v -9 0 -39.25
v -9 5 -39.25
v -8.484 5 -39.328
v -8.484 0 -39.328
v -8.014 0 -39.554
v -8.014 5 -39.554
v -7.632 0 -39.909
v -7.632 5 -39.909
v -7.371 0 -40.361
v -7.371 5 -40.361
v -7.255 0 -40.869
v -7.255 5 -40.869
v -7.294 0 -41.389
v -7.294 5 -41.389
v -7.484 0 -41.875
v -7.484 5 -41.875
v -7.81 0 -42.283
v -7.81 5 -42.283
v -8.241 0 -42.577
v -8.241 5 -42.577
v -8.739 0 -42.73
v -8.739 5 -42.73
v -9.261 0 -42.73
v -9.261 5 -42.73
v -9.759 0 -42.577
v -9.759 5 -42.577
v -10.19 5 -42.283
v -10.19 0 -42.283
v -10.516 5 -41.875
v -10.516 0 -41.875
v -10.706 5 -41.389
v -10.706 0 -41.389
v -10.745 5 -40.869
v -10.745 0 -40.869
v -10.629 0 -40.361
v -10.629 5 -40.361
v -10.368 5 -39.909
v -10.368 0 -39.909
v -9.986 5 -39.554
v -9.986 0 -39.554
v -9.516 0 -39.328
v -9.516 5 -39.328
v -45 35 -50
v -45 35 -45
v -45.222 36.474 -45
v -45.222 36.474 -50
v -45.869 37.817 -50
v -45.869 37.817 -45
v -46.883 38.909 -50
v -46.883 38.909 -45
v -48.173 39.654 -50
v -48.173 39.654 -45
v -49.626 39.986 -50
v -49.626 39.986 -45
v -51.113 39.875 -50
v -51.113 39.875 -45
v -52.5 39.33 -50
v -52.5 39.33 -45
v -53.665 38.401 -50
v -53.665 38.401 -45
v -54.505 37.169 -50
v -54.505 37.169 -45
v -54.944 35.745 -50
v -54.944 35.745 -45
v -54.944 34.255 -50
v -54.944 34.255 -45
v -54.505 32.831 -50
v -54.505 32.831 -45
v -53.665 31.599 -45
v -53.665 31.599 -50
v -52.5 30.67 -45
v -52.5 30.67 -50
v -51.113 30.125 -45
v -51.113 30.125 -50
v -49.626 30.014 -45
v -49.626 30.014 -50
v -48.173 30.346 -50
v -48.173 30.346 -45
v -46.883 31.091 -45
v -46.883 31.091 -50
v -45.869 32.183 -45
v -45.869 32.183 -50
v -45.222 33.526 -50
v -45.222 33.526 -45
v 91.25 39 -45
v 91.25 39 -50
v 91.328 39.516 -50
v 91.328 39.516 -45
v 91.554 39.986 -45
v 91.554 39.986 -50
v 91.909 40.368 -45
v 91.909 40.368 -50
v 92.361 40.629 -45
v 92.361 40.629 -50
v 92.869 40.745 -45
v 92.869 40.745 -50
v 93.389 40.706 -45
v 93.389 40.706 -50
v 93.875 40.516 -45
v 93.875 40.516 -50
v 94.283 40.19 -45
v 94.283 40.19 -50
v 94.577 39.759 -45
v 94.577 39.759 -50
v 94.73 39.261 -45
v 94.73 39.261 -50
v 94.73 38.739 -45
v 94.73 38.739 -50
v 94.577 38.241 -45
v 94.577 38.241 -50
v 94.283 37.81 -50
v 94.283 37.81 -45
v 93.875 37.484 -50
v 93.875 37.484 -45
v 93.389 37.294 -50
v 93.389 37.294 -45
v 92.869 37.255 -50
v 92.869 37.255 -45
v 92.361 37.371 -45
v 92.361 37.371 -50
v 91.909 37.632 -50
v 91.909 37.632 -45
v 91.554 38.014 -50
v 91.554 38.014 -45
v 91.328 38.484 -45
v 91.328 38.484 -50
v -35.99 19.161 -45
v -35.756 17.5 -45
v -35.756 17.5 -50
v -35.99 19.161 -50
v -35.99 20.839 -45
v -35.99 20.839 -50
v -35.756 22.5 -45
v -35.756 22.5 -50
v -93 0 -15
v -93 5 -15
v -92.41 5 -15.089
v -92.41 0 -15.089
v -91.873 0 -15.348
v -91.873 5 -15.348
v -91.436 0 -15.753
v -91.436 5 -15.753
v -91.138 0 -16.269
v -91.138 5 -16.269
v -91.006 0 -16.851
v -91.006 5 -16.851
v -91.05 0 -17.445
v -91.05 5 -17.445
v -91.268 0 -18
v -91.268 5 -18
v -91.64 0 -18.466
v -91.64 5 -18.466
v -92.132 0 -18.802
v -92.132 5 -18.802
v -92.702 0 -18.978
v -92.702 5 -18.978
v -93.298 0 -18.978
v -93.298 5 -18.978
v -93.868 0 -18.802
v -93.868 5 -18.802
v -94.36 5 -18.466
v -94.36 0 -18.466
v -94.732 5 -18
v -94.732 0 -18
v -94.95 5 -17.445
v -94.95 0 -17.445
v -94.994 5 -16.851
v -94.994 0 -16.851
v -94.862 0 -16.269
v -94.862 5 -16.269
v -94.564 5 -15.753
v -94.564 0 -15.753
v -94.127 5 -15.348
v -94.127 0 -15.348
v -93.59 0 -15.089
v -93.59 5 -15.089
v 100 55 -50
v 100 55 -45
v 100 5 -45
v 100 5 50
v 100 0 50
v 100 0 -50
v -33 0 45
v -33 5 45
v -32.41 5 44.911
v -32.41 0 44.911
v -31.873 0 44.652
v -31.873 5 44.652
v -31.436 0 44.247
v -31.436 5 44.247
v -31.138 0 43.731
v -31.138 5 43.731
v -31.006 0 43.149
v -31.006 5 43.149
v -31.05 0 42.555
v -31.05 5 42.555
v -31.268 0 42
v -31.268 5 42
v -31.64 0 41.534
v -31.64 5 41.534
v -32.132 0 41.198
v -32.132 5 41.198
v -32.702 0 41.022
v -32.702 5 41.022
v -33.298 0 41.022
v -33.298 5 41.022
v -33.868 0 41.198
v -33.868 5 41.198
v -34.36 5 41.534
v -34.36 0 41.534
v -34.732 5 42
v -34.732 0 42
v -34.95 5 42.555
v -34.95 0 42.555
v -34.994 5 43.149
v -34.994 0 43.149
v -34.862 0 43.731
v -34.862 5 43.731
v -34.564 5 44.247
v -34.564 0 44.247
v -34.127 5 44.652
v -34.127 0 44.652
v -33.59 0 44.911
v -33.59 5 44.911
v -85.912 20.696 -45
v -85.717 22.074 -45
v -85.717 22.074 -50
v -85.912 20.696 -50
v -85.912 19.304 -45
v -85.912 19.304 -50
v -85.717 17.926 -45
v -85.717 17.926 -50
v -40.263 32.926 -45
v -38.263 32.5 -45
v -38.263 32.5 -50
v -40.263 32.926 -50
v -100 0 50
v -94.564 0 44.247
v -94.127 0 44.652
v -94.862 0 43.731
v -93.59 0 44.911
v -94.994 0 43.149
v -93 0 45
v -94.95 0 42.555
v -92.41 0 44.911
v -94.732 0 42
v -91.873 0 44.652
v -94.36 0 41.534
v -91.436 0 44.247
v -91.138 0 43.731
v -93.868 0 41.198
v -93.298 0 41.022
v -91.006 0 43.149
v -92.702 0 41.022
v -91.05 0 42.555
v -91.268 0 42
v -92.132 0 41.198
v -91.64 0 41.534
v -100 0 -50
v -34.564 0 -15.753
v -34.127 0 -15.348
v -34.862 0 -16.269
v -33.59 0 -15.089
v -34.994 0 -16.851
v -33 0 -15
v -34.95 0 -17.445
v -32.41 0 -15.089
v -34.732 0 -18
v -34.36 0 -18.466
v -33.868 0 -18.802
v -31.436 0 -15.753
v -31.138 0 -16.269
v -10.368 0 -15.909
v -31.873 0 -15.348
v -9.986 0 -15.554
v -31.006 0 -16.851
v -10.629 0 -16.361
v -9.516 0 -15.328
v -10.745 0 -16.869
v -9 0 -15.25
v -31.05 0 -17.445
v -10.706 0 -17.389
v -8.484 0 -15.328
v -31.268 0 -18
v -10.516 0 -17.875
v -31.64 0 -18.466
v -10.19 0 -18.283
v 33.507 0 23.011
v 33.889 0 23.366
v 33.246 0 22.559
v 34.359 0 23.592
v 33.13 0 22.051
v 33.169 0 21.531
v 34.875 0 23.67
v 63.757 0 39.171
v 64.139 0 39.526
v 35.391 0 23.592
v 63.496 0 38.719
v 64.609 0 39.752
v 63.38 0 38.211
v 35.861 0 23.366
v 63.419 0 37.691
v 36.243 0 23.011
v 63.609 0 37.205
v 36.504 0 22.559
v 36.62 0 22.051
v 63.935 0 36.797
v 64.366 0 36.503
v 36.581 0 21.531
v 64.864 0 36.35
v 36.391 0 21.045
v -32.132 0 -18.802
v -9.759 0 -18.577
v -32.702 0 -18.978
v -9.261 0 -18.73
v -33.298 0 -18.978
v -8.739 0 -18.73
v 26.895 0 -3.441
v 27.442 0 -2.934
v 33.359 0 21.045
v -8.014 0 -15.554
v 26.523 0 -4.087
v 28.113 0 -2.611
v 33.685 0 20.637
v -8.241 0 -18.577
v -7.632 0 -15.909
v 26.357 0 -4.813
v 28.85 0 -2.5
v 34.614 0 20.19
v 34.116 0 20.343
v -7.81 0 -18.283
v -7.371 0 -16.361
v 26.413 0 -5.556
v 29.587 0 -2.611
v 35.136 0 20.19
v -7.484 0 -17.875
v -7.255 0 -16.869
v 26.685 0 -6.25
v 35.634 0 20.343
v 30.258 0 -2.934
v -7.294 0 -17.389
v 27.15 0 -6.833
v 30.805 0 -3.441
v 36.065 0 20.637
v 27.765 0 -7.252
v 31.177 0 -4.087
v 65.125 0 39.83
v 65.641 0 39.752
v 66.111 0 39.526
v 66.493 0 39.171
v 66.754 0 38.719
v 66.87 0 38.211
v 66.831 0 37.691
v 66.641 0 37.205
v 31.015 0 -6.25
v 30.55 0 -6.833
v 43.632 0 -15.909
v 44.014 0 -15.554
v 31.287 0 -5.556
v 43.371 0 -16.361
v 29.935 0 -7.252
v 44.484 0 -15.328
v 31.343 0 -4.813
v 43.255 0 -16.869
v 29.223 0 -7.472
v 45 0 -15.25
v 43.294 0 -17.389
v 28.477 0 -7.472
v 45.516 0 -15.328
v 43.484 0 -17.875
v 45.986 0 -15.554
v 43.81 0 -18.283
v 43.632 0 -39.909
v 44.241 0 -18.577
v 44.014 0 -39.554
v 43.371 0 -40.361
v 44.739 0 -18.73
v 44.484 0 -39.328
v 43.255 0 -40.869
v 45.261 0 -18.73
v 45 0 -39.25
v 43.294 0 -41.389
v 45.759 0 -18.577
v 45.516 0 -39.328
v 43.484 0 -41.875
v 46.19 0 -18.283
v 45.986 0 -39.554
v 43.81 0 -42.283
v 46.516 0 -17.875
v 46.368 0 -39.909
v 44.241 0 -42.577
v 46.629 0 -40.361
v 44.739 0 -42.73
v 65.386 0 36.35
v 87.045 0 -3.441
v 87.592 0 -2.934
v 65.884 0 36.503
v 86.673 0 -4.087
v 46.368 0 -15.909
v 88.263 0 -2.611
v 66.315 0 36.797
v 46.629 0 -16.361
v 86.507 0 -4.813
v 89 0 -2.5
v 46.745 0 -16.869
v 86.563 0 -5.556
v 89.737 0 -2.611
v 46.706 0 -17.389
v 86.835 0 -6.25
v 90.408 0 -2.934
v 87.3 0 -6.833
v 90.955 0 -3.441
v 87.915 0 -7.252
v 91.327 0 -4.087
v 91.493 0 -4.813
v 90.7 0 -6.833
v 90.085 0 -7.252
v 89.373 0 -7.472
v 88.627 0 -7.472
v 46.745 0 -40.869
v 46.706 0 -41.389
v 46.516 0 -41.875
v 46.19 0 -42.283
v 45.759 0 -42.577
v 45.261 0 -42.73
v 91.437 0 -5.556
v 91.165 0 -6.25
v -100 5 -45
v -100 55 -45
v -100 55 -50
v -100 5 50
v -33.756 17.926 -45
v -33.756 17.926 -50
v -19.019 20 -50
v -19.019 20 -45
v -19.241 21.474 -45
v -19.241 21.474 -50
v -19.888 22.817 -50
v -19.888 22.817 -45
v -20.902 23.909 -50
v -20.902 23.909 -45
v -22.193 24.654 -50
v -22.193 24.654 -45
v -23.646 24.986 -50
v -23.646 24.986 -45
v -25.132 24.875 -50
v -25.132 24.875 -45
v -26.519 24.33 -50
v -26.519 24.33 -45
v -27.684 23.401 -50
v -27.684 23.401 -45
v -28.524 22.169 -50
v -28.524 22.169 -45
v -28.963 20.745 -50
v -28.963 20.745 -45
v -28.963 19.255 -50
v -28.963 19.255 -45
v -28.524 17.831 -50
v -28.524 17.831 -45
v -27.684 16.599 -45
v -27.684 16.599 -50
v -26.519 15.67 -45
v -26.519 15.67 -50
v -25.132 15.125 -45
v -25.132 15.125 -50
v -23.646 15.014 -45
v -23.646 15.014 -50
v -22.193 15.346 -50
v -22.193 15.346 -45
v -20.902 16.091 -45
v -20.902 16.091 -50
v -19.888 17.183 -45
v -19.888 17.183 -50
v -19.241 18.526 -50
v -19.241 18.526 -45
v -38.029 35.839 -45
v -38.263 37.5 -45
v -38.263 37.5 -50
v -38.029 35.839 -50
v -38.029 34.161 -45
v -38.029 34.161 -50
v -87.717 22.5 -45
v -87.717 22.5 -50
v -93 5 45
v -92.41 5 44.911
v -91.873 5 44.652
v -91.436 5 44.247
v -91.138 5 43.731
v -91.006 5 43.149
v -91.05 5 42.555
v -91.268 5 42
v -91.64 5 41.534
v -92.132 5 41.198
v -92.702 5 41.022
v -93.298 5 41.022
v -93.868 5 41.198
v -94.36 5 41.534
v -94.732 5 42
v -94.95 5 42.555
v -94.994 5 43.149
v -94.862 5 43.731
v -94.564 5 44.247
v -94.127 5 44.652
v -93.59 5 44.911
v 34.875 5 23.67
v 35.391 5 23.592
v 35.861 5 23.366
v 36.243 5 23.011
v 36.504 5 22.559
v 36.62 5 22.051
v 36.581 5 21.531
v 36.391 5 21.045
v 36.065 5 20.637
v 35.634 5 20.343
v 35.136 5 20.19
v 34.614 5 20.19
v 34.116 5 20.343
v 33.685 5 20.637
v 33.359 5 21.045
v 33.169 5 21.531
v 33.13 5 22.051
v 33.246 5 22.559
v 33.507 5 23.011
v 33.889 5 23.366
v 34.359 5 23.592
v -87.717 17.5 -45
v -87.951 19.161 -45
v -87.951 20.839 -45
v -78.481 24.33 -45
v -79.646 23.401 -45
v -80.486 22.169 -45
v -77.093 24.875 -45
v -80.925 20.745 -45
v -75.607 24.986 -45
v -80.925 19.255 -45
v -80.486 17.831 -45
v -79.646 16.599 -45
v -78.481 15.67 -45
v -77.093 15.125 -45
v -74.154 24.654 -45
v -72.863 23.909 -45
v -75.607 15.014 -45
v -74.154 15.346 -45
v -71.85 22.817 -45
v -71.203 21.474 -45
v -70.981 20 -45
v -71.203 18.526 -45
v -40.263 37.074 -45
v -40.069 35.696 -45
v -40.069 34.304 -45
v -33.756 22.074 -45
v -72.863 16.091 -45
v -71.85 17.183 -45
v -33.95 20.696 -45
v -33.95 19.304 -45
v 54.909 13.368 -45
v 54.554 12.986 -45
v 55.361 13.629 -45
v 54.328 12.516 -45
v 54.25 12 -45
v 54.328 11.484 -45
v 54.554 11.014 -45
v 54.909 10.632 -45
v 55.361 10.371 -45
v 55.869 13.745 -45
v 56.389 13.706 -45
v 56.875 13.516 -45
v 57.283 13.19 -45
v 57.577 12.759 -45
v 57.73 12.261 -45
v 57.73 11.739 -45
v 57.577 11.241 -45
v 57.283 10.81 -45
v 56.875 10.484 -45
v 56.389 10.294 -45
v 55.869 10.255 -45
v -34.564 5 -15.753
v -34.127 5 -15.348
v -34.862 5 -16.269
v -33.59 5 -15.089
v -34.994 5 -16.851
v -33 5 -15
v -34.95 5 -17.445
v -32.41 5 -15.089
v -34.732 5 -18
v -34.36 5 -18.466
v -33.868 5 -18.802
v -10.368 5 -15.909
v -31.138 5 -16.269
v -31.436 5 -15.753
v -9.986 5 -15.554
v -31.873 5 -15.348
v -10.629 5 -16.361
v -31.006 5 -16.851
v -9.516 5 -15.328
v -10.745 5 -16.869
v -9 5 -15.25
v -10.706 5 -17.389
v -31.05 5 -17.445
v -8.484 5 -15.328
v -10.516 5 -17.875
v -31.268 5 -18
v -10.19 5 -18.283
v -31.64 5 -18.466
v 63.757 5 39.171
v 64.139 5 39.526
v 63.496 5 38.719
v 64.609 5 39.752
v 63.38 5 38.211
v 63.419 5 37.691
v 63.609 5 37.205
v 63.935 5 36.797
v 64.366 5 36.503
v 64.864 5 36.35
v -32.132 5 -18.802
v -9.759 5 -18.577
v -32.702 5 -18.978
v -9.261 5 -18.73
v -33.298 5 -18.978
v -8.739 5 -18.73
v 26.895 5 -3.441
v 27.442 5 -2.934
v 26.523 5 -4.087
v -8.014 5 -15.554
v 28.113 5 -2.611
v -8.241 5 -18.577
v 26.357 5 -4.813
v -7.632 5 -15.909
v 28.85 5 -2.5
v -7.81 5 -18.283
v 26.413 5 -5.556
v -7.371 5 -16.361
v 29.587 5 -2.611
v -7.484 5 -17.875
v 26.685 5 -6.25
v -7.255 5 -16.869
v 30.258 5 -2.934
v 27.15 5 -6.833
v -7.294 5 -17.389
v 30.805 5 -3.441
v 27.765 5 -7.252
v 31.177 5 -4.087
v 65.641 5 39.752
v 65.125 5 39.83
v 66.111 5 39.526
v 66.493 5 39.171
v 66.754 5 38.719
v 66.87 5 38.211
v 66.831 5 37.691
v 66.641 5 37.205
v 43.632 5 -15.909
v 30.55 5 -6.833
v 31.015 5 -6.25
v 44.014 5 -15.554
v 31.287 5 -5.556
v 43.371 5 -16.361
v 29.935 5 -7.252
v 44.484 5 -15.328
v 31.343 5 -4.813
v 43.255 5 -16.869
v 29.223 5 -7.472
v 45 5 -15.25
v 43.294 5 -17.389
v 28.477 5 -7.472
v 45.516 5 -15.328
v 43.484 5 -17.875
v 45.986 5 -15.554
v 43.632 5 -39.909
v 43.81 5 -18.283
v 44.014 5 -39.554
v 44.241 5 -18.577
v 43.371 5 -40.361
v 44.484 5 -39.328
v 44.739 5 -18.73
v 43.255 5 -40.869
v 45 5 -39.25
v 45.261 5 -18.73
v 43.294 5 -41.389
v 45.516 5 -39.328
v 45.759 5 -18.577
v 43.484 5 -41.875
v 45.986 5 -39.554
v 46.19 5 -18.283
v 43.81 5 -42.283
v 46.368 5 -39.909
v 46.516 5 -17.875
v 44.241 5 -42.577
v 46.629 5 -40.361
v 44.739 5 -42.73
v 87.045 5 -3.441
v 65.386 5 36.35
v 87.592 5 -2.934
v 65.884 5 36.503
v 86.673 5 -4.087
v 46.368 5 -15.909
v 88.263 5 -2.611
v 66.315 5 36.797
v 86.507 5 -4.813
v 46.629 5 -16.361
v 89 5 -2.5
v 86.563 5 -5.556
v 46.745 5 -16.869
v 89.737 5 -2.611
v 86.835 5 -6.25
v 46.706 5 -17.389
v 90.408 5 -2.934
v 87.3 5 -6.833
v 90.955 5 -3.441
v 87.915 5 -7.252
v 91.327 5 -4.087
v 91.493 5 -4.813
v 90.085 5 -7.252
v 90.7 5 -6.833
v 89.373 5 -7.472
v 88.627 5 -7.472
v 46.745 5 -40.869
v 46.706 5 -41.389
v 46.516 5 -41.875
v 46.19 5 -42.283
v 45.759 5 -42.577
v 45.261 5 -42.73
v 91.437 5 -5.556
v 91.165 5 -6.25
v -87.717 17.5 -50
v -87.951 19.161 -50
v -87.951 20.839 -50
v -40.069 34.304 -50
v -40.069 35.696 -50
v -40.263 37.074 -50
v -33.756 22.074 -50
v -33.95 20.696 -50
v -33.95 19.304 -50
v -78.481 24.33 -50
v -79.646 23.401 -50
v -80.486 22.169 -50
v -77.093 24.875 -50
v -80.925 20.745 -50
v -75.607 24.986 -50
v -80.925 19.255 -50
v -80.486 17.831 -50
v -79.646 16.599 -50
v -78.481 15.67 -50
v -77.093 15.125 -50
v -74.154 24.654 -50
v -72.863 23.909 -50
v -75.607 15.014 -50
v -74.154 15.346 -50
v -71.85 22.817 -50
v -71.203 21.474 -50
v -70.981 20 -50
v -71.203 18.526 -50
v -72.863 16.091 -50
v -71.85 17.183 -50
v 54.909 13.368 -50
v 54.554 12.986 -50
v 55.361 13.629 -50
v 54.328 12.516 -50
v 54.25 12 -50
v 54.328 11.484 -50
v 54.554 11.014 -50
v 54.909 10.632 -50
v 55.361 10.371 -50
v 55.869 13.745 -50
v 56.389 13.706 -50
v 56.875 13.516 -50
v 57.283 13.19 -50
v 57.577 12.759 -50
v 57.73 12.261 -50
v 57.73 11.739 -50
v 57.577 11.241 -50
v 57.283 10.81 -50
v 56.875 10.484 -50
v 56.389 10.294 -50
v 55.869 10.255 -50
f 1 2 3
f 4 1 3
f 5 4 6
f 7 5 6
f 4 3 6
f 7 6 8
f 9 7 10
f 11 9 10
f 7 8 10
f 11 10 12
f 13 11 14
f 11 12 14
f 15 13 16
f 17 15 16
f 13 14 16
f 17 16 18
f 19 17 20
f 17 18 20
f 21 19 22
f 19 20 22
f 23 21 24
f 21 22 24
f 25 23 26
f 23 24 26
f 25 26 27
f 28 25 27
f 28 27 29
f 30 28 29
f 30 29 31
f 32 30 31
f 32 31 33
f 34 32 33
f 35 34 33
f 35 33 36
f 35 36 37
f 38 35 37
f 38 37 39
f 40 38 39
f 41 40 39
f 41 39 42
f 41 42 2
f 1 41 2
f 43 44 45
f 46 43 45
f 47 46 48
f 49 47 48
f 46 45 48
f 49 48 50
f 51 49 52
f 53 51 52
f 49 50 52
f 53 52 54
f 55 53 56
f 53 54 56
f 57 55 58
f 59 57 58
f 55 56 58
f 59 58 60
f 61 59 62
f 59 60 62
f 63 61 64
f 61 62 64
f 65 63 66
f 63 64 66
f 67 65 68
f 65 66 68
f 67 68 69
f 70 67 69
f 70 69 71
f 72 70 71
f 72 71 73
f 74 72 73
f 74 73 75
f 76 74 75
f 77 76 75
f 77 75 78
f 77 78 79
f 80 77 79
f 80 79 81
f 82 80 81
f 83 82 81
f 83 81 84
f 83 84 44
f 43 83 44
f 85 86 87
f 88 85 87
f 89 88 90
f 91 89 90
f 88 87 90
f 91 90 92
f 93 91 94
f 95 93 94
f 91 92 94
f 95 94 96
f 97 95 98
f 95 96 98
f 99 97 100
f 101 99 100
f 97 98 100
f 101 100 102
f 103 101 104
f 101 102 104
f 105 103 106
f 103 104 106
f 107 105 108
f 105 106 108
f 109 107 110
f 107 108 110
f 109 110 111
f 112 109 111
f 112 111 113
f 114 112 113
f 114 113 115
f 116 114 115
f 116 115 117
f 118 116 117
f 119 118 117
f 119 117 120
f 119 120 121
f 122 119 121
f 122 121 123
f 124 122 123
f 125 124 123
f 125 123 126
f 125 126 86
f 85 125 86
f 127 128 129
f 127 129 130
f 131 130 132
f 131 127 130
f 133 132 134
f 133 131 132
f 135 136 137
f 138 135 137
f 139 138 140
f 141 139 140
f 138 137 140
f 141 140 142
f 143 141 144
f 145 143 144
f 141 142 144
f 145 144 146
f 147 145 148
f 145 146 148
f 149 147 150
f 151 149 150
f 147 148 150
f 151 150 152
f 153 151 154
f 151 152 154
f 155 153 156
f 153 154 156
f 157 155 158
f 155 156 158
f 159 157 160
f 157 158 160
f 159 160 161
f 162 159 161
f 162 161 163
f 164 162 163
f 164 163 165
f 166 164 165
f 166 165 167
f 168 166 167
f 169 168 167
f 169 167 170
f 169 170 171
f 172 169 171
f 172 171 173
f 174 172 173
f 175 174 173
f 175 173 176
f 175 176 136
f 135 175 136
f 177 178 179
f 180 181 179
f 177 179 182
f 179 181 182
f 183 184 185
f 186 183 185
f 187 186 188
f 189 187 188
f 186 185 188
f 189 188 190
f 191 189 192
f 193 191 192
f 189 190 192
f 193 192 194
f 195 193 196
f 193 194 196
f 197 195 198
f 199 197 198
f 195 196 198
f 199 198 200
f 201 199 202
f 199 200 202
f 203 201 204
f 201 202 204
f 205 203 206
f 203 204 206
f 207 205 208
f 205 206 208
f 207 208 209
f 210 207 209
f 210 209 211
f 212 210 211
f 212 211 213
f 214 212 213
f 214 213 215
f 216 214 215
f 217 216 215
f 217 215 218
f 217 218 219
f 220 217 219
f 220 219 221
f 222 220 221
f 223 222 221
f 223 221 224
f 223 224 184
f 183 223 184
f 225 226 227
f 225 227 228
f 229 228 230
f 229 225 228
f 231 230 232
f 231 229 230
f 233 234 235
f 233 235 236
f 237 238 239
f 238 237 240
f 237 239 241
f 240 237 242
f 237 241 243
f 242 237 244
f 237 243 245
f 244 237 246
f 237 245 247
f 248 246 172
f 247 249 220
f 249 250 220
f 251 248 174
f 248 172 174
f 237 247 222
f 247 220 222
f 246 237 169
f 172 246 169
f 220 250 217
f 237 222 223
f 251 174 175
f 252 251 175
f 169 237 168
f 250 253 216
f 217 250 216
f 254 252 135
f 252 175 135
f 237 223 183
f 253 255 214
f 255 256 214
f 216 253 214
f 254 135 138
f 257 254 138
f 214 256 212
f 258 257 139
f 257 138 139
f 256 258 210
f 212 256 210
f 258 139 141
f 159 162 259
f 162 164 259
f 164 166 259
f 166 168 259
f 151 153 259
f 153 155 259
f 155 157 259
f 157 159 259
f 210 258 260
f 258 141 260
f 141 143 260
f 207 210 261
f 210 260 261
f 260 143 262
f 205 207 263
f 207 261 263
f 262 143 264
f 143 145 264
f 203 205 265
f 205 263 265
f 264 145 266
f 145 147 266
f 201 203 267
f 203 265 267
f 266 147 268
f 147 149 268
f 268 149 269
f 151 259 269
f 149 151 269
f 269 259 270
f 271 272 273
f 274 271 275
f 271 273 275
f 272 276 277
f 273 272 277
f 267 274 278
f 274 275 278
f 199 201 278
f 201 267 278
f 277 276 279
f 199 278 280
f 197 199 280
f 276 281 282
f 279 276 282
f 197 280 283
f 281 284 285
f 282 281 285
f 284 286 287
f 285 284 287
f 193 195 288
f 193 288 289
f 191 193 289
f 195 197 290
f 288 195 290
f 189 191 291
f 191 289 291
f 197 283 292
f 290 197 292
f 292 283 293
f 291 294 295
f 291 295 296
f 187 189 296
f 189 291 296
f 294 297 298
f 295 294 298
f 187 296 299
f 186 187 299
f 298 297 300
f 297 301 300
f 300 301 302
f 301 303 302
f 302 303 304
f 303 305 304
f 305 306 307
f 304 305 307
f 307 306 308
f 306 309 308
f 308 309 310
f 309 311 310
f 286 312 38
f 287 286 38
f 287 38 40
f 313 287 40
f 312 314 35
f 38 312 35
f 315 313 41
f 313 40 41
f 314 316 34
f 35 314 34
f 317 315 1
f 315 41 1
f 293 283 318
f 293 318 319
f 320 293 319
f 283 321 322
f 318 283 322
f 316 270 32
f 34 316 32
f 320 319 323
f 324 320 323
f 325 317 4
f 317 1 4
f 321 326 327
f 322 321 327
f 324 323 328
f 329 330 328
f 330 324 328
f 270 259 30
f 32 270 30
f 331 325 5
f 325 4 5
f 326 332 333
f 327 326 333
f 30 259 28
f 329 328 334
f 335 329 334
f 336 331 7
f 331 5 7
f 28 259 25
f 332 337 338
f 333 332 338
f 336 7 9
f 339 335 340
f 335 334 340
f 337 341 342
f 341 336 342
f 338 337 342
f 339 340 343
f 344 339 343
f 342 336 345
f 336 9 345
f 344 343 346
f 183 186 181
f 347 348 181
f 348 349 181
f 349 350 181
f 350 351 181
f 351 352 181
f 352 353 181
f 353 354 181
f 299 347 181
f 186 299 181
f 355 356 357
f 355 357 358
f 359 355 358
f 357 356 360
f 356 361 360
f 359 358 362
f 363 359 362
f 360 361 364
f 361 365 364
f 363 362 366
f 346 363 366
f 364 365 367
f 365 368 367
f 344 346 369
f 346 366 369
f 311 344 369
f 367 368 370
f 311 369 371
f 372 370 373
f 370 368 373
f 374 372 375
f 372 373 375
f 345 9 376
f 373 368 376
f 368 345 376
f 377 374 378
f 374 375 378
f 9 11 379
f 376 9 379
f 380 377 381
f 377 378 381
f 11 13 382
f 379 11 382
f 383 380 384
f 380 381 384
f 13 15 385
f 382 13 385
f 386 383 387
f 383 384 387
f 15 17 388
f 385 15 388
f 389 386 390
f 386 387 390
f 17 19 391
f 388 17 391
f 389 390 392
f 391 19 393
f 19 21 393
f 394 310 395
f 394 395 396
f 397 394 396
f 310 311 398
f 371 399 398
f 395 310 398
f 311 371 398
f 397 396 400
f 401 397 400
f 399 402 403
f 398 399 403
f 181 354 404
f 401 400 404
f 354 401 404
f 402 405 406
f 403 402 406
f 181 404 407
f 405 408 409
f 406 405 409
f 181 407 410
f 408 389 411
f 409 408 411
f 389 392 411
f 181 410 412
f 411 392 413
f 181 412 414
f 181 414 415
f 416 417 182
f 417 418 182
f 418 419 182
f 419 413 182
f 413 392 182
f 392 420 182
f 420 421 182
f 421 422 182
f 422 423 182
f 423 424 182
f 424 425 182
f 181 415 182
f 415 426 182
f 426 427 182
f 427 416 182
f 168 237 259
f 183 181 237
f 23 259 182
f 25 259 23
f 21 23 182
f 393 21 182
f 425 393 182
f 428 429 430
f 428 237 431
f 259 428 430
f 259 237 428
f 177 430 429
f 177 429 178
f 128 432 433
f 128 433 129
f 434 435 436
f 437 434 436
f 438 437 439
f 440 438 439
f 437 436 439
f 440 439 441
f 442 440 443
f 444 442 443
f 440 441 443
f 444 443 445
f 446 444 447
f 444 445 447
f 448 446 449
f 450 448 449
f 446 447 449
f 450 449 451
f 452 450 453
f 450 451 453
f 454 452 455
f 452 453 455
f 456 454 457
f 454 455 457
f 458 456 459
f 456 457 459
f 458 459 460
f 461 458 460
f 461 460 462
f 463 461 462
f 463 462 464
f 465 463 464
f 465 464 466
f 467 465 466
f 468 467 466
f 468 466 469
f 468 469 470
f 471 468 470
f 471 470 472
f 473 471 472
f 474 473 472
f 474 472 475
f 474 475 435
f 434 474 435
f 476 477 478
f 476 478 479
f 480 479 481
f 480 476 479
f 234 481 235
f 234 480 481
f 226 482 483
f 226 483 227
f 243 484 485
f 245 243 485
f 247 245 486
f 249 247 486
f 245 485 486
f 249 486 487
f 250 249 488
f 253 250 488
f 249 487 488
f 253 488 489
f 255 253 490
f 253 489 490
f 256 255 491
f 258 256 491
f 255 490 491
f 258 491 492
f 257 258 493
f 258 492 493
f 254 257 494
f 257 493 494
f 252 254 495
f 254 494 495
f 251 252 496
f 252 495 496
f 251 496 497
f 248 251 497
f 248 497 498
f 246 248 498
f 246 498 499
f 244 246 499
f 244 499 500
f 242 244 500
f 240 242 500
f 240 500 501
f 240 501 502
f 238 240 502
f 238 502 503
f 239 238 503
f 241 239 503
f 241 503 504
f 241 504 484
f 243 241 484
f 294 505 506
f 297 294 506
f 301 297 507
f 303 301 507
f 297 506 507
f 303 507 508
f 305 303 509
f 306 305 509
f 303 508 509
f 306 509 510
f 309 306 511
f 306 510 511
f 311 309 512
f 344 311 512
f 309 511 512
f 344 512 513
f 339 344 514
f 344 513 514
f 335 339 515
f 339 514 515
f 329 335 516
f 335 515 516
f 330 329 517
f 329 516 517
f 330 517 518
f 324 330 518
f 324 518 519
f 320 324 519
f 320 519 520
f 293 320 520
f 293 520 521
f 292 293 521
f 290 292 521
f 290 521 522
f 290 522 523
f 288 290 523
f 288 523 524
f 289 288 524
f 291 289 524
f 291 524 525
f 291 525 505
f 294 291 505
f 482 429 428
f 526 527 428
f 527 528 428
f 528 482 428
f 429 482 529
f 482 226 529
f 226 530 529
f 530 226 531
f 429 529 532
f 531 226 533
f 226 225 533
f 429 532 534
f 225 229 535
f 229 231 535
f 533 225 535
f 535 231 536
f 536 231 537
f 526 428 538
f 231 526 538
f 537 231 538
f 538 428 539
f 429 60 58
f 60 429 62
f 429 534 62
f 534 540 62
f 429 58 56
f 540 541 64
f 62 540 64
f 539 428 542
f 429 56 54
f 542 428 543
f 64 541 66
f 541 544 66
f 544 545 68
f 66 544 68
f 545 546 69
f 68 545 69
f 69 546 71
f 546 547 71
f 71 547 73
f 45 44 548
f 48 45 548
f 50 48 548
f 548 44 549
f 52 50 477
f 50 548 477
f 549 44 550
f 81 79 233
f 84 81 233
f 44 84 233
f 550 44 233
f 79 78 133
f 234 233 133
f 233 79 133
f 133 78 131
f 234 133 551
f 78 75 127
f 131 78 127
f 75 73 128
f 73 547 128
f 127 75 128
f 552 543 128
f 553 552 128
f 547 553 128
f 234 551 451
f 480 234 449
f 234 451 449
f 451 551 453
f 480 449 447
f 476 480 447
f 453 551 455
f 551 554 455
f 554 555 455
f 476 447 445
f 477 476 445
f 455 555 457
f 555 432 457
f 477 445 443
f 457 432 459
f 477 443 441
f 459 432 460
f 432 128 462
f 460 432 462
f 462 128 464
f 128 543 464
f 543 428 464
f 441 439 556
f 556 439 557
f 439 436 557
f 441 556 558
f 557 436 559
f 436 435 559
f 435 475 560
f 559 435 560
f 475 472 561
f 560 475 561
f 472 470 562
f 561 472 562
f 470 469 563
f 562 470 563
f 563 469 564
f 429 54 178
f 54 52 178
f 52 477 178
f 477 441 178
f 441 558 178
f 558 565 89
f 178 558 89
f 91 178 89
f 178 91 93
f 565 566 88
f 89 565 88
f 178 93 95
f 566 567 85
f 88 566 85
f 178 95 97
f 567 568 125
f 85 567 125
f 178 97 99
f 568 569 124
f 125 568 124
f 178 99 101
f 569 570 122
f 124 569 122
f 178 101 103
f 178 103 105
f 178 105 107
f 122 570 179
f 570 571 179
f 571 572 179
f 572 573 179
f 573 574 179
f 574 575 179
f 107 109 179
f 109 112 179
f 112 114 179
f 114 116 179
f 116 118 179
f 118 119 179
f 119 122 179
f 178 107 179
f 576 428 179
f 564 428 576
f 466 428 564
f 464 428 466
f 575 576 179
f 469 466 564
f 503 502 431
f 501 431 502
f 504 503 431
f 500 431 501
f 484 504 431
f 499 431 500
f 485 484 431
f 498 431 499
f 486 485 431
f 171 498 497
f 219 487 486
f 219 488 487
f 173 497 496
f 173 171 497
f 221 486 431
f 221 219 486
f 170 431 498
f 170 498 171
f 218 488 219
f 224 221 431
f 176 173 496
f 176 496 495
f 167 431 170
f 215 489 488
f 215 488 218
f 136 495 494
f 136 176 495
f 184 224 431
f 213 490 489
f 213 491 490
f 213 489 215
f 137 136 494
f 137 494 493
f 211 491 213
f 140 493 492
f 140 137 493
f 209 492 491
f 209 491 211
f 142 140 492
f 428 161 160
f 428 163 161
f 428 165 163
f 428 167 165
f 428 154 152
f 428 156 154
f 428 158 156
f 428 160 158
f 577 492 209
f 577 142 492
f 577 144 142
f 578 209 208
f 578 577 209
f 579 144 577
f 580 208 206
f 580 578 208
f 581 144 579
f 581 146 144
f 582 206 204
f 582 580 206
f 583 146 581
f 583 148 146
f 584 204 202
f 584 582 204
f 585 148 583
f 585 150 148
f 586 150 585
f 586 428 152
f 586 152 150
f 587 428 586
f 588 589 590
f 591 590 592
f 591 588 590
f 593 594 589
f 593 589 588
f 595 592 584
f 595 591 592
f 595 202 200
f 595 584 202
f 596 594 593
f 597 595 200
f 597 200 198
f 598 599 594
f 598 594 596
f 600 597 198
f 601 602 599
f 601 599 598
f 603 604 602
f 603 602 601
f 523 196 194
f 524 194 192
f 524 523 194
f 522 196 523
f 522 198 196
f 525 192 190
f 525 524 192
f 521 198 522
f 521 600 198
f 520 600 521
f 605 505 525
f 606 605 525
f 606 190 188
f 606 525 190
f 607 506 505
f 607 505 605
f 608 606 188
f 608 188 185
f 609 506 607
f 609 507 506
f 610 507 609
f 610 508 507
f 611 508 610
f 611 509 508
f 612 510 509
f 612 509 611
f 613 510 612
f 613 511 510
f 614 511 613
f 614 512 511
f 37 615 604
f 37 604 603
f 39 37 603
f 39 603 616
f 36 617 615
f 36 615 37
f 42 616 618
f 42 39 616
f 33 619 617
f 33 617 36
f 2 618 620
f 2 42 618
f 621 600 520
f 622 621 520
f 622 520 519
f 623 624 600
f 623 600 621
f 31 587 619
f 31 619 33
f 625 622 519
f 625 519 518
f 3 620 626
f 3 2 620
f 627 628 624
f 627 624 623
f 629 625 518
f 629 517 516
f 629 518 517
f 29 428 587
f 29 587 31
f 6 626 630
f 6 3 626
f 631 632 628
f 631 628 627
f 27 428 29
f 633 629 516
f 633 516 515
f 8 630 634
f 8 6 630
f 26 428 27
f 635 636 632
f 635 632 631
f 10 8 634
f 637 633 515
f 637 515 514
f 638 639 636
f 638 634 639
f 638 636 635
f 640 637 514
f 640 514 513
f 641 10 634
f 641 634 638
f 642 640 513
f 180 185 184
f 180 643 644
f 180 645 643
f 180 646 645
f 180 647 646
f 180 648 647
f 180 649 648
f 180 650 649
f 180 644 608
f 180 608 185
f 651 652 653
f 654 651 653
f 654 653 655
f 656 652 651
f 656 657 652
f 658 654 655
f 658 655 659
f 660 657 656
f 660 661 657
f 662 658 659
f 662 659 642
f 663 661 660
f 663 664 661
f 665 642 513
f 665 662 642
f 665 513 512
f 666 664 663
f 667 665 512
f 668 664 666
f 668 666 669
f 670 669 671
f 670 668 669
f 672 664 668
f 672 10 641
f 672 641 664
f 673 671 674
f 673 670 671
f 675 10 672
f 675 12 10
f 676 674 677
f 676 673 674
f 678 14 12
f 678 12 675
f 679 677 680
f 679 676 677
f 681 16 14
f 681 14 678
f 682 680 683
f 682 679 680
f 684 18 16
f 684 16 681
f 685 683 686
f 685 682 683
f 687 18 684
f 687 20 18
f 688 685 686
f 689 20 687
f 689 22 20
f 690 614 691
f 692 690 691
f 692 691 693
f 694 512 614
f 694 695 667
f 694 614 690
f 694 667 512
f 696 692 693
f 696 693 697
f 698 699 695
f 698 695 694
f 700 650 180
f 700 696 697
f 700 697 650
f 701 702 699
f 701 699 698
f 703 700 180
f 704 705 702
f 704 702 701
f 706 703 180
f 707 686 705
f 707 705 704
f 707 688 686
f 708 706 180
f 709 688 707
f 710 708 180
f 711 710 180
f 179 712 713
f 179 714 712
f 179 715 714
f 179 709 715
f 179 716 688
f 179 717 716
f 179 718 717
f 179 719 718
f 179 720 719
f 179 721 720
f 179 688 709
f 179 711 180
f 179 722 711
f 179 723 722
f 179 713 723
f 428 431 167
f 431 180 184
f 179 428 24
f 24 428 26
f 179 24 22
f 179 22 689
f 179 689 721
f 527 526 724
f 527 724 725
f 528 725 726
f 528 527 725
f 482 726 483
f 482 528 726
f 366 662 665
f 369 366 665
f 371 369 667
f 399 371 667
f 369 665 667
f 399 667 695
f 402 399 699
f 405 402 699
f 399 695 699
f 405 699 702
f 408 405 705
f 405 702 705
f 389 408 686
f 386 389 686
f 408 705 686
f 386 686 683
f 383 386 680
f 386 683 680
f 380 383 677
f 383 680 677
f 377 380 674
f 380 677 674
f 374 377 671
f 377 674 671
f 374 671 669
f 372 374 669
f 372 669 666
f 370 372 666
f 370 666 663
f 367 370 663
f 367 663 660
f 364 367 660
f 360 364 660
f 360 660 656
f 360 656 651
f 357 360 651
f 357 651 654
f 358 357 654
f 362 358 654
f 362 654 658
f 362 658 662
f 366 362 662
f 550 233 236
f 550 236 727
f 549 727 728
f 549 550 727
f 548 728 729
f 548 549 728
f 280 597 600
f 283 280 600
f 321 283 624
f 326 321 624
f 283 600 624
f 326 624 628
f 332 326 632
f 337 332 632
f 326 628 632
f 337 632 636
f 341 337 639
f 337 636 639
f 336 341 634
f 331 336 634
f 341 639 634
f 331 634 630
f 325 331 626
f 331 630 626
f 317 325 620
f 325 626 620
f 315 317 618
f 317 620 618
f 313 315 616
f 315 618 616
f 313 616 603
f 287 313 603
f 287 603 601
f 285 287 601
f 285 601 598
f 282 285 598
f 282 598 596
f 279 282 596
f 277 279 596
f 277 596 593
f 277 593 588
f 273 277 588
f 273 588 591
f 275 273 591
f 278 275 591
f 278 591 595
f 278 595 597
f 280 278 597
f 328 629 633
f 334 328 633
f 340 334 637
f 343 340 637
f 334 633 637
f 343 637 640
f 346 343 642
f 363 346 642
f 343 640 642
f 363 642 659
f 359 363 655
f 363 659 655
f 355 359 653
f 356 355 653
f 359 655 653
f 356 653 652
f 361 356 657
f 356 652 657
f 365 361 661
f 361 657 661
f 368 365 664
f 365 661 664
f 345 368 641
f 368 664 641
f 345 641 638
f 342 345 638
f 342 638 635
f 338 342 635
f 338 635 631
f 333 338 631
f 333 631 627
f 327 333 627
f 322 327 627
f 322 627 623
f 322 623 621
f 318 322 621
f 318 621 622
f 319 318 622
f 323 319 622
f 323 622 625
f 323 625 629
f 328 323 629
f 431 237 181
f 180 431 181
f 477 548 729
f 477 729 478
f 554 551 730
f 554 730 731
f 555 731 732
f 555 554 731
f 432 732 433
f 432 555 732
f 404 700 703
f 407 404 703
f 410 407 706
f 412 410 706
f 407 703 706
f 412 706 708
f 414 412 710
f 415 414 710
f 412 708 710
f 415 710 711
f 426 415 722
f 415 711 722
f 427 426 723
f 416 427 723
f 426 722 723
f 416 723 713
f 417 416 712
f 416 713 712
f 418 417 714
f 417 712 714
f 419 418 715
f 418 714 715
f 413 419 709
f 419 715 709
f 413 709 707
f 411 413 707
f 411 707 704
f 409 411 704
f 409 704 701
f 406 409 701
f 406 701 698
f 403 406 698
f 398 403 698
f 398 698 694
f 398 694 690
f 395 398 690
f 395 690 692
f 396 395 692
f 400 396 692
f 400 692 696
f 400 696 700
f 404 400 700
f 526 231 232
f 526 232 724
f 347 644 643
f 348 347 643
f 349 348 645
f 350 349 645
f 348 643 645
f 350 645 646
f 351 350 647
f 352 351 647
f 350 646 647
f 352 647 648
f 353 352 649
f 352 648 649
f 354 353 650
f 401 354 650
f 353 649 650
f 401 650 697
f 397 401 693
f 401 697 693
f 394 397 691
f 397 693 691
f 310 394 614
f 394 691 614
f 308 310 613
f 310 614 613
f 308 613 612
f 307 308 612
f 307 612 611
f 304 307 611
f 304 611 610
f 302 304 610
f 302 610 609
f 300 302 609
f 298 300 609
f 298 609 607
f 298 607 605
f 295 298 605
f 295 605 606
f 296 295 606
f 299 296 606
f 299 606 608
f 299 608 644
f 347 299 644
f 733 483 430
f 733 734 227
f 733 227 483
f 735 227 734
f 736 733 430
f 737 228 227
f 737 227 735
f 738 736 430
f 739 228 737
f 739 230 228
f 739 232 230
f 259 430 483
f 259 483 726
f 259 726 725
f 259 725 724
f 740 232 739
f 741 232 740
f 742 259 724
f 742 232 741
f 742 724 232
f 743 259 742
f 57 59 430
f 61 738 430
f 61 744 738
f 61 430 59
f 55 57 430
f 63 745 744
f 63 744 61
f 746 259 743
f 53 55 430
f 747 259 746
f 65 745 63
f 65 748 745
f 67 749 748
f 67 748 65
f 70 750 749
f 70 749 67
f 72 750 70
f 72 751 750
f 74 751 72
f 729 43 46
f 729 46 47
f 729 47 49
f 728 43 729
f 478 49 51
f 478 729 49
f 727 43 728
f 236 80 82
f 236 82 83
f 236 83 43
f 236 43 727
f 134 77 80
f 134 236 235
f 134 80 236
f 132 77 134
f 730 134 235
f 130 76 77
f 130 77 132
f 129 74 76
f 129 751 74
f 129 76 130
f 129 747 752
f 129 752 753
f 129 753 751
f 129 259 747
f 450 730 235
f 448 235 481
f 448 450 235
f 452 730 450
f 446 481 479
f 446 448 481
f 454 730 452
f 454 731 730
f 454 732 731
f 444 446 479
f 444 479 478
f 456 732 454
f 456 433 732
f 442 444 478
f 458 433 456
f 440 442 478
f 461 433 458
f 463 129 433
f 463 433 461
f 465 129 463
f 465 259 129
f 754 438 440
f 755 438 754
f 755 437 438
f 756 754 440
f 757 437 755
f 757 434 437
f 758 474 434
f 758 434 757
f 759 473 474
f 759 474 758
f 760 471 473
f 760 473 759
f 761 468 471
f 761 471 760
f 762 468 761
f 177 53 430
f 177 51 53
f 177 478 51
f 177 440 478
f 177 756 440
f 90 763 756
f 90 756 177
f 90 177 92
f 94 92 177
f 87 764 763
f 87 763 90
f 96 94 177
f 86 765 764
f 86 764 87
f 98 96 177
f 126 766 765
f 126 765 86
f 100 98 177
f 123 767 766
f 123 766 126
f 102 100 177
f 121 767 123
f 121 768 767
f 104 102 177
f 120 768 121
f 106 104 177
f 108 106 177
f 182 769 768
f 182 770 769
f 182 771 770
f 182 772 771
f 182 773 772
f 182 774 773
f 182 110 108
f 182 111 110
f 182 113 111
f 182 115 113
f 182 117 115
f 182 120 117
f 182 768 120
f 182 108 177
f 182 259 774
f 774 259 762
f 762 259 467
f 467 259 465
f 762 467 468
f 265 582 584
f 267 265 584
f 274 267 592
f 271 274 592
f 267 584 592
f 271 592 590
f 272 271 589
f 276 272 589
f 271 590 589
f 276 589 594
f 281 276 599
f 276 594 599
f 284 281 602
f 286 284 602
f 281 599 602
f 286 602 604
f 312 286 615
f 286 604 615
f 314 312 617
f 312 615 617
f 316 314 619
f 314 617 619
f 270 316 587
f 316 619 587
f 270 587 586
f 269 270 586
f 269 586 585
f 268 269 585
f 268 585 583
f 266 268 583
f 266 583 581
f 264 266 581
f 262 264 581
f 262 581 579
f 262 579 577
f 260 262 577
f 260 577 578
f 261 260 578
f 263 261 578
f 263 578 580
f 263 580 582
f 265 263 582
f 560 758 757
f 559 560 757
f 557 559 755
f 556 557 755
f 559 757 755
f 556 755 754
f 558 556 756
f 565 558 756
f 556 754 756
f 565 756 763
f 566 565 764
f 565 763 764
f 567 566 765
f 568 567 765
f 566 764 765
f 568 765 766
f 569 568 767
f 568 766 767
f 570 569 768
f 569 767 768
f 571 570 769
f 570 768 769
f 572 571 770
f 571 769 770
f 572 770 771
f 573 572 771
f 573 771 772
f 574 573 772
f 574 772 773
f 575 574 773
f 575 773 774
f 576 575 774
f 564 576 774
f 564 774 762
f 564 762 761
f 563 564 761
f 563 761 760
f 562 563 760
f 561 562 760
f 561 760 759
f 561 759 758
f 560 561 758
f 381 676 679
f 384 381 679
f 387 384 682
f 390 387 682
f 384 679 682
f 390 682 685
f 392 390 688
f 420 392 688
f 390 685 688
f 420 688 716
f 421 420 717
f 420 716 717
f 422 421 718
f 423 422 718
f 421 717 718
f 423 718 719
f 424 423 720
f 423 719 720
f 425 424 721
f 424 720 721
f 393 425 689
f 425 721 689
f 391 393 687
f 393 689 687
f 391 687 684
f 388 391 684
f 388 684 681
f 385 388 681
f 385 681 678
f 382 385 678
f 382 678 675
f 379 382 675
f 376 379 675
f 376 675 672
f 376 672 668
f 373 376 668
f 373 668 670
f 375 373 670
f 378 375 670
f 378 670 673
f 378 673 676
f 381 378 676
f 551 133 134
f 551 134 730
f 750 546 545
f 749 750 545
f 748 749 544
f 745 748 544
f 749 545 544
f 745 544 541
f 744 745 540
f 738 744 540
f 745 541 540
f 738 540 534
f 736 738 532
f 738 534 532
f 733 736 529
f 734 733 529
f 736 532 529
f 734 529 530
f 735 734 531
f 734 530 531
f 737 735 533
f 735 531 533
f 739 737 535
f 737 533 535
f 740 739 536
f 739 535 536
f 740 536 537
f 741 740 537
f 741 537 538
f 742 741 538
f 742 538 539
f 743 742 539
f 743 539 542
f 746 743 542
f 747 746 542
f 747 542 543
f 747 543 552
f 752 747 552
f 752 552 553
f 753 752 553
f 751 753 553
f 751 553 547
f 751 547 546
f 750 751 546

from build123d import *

# Parameters (mm, degrees)
SKETCH1_W           = 200
SKETCH1_H           = 100
BOSS_EXTRUDE1_DEPTH = 5
SKETCH2_W           = 200
SKETCH2_H           = 5
BOSS_EXTRUDE2_DEPTH = 50
SKETCH3_R           = 1.75
CUT_EXTRUDE1_DEPTH  = 50
SKETCH4_R           = 2.5
CUT_EXTRUDE2_DEPTH  = 123.474487139
SKETCH7_R           = 2
CUT_EXTRUDE3_DEPTH  = 123.474487139
SKETCH8_R           = 1.75
CUT_EXTRUDE4_DEPTH  = 123.474487139
SKETCH11_R          = 5
CUT_EXTRUDE6_DEPTH  = 149.492424049
SKETCH12_R          = 1.75
CUT_EXTRUDE7_DEPTH  = 123.474487139


with BuildPart() as part:
    # Sketch1 → Boss-Extrude1 (new body)
    with BuildSketch(Plane(origin=(0, 0, 0), x_dir=(1, 0, 0), z_dir=(0, 1, 0))):
        Rectangle(SKETCH1_W, SKETCH1_H)
    extrude(amount=BOSS_EXTRUDE1_DEPTH)

    # Sketch2 → Boss-Extrude2 (add)
    with BuildSketch(Plane(origin=(0, 5, 0), x_dir=(1, 0, 0), z_dir=(0, 1, 0))):
        with Locations((0, 47.5)):
            Rectangle(SKETCH2_W, SKETCH2_H)
    extrude(amount=BOSS_EXTRUDE2_DEPTH)

    # Sketch3 → Cut-Extrude1 (cut)
    with BuildSketch(Plane(origin=(0, 0, -50), x_dir=(-1, 0, 0), z_dir=(0, 0, -1))):
        with Locations((-93, 39)):
            Circle(SKETCH3_R)
        with Locations((-56, 12)):
            Circle(SKETCH3_R)
    extrude(amount=-CUT_EXTRUDE1_DEPTH, mode=Mode.SUBTRACT)

    # Sketch4 → Cut-Extrude2 (cut, through all)
    with BuildSketch(Plane(origin=(0, 5, 0), x_dir=(1, 0, 0), z_dir=(0, 1, 0))):
        with Locations(Location((28.85, 5, 0), (0, 0, 270))):
            Circle(SKETCH4_R)
        with Locations(Location((89, 5, 0), (0, 0, 270))):
            Circle(SKETCH4_R)
    extrude(amount=-CUT_EXTRUDE2_DEPTH, mode=Mode.SUBTRACT)

    # Sketch7 → Cut-Extrude3 (cut, through all)
    with BuildSketch(Plane(origin=(0, 5, 0), x_dir=(1, 0, 0), z_dir=(0, 1, 0))):
        with Locations(Location((-93, 17, 0), (0, 0, 270))):
            Circle(SKETCH7_R)
        with Locations(Location((-33, 17, 0), (0, 0, 270))):
            Circle(SKETCH7_R)
        with Locations(Location((-33, -43, 0), (0, 0, 270))):
            Circle(SKETCH7_R)
        with Locations(Location((-93, -43, 0), (0, 0, 270))):
            Circle(SKETCH7_R)
    extrude(amount=-CUT_EXTRUDE3_DEPTH, mode=Mode.SUBTRACT)

    # Sketch8 → Cut-Extrude4 (cut, through all)
    with BuildSketch(Plane(origin=(0, 5, 0), x_dir=(1, 0, 0), z_dir=(0, 1, 0))):
        with Locations(Location((65.125, -38.08, 0), (0, 0, 270))):
            Circle(SKETCH8_R)
        with Locations(Location((34.875, -21.92, 0), (0, 0, 270))):
            Circle(SKETCH8_R)
    extrude(amount=-CUT_EXTRUDE4_DEPTH, mode=Mode.SUBTRACT)

    # Sketch11 → Cut-Extrude6 (cut, through all)
    with BuildSketch(Plane.XY.offset(-45)):
        with Locations((-75.980762114, 20)):
            Circle(SKETCH11_R)
        with Locations((-50, 35)):
            Circle(SKETCH11_R)
        with Locations((-24.019237886, 20)):
            Circle(SKETCH11_R)
        with BuildLine():
            Line((-87.717456708, 22.5), (-85.717456708, 22.073985677))
            ThreePointArc((-85.717456708, 22.073985677), (-85.935893364, 20), (-85.717456708, 17.926014323))
            Line((-85.717456708, 17.926014323), (-87.717456708, 17.5))
            ThreePointArc((-87.717456708, 17.5), (-87.980762114, 20), (-87.717456708, 22.5))
        make_face()
        with BuildLine():
            Line((-40.263305406, 37.073985677), (-38.263305406, 37.5))
            ThreePointArc((-38.263305406, 37.5), (-38, 35), (-38.263305406, 32.5))
            Line((-38.263305406, 32.5), (-40.263305406, 32.926014323))
            ThreePointArc((-40.263305406, 32.926014323), (-40.04486875, 35), (-40.263305406, 37.073985677))
        make_face()
        with BuildLine():
            Line((-35.755932481, 22.5), (-33.755932481, 22.073985677))
            ThreePointArc((-33.755932481, 22.073985677), (-33.974369137, 20), (-33.755932481, 17.926014323))
            Line((-33.755932481, 17.926014323), (-35.755932481, 17.5))
            ThreePointArc((-35.755932481, 17.5), (-36.019237886, 20), (-35.755932481, 22.5))
        make_face()
    extrude(amount=-CUT_EXTRUDE6_DEPTH, mode=Mode.SUBTRACT)

    # Sketch12 → Cut-Extrude7 (cut, through all)
    with BuildSketch(Plane(origin=(0, 5, 0), x_dir=(1, 0, 0), z_dir=(0, 1, 0))):
        with Locations(Location((-9, 41, 0), (0, 0, 270))):
            Circle(SKETCH12_R)
        with Locations(Location((45, 41, 0), (0, 0, 270))):
            Circle(SKETCH12_R)
        with Locations(Location((-9, 17, 0), (0, 0, 270))):
            Circle(SKETCH12_R)
        with Locations(Location((45, 17, 0), (0, 0, 270))):
            Circle(SKETCH12_R)
    extrude(amount=-CUT_EXTRUDE7_DEPTH, mode=Mode.SUBTRACT)


solid = part.part
